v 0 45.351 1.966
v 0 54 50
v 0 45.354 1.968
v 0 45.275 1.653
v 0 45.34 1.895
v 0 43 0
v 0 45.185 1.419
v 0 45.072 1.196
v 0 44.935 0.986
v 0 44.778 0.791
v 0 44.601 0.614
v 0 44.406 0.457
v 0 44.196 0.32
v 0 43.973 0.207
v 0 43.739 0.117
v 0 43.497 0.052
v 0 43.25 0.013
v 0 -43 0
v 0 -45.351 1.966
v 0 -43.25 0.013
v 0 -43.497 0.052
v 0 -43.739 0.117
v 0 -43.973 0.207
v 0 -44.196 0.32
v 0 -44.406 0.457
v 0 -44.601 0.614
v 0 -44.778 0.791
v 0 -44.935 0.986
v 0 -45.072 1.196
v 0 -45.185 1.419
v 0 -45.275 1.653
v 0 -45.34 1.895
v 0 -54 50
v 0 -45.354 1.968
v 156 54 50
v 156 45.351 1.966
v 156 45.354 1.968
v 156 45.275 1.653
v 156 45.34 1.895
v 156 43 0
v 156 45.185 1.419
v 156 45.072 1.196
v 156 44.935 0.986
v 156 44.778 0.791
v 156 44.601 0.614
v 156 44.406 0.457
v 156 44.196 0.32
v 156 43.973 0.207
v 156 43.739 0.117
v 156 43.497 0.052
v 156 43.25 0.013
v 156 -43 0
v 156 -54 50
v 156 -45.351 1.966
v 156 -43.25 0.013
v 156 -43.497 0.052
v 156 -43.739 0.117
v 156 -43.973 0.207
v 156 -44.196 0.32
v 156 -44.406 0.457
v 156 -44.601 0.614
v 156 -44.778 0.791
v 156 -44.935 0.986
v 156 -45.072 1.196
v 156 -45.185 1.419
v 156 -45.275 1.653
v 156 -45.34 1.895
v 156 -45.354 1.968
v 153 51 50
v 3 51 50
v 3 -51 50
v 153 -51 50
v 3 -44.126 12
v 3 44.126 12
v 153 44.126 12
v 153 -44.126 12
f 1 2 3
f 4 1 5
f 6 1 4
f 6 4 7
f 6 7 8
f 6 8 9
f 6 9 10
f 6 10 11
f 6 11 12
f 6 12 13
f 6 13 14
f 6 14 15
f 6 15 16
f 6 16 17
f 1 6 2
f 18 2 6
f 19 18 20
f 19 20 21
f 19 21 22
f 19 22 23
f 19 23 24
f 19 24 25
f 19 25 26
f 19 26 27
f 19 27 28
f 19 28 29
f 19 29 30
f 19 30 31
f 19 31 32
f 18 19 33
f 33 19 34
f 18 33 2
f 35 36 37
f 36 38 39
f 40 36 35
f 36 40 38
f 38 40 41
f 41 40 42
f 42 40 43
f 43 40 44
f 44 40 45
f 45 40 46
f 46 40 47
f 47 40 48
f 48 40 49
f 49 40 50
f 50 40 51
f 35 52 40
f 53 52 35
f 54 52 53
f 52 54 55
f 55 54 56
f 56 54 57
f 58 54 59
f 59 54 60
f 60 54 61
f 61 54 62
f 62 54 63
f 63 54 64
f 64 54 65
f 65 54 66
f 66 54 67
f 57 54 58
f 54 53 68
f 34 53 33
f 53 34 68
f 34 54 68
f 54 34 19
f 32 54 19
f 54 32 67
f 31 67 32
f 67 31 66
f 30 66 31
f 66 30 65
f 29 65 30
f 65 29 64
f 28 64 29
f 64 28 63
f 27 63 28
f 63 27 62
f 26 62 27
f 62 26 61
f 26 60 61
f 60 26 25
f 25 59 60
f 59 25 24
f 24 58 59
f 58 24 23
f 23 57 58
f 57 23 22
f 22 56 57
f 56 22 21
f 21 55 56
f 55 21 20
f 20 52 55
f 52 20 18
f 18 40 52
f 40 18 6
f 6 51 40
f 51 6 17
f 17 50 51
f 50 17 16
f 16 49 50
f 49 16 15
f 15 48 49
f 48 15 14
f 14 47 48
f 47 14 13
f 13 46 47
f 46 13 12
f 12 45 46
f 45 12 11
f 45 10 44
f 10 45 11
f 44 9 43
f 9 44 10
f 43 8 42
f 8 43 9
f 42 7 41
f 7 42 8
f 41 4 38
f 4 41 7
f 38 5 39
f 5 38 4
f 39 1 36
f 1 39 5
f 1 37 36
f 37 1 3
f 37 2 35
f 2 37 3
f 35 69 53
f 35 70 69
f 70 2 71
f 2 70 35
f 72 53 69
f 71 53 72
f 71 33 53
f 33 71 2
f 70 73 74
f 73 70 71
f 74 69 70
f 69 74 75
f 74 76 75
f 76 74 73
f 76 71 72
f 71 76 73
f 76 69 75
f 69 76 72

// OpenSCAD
// file: utils.scad
// Private variables
HEIGHT = 50;

TOP_WIDTH_NO_FILLET = 108;
BOTTOM_WIDTH_NO_FILLET = 90;

TOP_FILLET_RADIUS = 5;
BOTTOM_FILLET_RADIUS = 2;


// Public prameters
function height() = HEIGHT;
function bottom_width_no_fillet() = BOTTOM_WIDTH_NO_FILLET;
function top_width_no_fillet() = TOP_WIDTH_NO_FILLET;
function bottom_fillet_radius() = BOTTOM_FILLET_RADIUS;
function top_fillet_radius() = TOP_FILLET_RADIUS;

function wall_angle() = 90+atan2((top_width_no_fillet()-bottom_width_no_fillet())/2, height());


inside_frame_profile();


module fillet(r, a=90) {
    p1 = [r,0];
    p2 = [sin(90-a)*r, sin(a)*r];
    dist = sqrt( pow(p2[0]-p1[0], 2) + pow(p2[1]-p1[1] ,2) );
    cr = (dist/2) / sin( (180-a)/2 );

    difference() {
        polygon([[0,0],p1,p2]);
        translate([r,cr]) circle(r=cr);
    }
}

module inside_frame_profile(offsets=[0,0,0]) {
          
    bottom_offset = offsets[0];
    top_offset = offsets[1];
    side_offset = offsets[2];

    right_bottom =  [bottom_offset,     -bottom_width_no_fillet()/2 + (sin(90-wall_angle())*bottom_offset) + side_offset];
    right_top =     [height()-top_offset, -top_width_no_fillet()/2    - (sin(90-wall_angle())*top_offset)    + side_offset];
    left_top =      [height()-top_offset,  top_width_no_fillet()/2    + (sin(90-wall_angle())*top_offset)    - side_offset];
    left_bottom =   [bottom_offset,      bottom_width_no_fillet()/2 - (sin(90-wall_angle())*bottom_offset) - side_offset];
    
    difference() {
        polygon([right_bottom, right_top, left_top, left_bottom]);
        translate([0,bottom_width_no_fillet()/2]) rotate([0,0,-90]) fillet(bottom_fillet_radius(), wall_angle(), $fn=60);
        translate([0,-bottom_width_no_fillet()/2]) rotate([0,0,-90]) mirror([1,0,0]) fillet(bottom_fillet_radius(), wall_angle(), $fn=60);
    }
}
// main file
use <utils.scad>;


WALL_THICKNESS = 3;

battery_box_assembly(150+WALL_THICKNESS*2);


module battery_box_assembly(length) {
    battery_box(length);
    
}


module battery_box(length) {
    difference() {
        rotate([0,-90,180]) linear_extrude(length) inside_frame_profile(offsets=[0,0,0]);
        translate([WALL_THICKNESS, 0]) rotate([0,-90,180]) linear_extrude(length-WALL_THICKNESS*2) inside_frame_profile(offsets=[10+2,0,WALL_THICKNESS]);
    }
}
